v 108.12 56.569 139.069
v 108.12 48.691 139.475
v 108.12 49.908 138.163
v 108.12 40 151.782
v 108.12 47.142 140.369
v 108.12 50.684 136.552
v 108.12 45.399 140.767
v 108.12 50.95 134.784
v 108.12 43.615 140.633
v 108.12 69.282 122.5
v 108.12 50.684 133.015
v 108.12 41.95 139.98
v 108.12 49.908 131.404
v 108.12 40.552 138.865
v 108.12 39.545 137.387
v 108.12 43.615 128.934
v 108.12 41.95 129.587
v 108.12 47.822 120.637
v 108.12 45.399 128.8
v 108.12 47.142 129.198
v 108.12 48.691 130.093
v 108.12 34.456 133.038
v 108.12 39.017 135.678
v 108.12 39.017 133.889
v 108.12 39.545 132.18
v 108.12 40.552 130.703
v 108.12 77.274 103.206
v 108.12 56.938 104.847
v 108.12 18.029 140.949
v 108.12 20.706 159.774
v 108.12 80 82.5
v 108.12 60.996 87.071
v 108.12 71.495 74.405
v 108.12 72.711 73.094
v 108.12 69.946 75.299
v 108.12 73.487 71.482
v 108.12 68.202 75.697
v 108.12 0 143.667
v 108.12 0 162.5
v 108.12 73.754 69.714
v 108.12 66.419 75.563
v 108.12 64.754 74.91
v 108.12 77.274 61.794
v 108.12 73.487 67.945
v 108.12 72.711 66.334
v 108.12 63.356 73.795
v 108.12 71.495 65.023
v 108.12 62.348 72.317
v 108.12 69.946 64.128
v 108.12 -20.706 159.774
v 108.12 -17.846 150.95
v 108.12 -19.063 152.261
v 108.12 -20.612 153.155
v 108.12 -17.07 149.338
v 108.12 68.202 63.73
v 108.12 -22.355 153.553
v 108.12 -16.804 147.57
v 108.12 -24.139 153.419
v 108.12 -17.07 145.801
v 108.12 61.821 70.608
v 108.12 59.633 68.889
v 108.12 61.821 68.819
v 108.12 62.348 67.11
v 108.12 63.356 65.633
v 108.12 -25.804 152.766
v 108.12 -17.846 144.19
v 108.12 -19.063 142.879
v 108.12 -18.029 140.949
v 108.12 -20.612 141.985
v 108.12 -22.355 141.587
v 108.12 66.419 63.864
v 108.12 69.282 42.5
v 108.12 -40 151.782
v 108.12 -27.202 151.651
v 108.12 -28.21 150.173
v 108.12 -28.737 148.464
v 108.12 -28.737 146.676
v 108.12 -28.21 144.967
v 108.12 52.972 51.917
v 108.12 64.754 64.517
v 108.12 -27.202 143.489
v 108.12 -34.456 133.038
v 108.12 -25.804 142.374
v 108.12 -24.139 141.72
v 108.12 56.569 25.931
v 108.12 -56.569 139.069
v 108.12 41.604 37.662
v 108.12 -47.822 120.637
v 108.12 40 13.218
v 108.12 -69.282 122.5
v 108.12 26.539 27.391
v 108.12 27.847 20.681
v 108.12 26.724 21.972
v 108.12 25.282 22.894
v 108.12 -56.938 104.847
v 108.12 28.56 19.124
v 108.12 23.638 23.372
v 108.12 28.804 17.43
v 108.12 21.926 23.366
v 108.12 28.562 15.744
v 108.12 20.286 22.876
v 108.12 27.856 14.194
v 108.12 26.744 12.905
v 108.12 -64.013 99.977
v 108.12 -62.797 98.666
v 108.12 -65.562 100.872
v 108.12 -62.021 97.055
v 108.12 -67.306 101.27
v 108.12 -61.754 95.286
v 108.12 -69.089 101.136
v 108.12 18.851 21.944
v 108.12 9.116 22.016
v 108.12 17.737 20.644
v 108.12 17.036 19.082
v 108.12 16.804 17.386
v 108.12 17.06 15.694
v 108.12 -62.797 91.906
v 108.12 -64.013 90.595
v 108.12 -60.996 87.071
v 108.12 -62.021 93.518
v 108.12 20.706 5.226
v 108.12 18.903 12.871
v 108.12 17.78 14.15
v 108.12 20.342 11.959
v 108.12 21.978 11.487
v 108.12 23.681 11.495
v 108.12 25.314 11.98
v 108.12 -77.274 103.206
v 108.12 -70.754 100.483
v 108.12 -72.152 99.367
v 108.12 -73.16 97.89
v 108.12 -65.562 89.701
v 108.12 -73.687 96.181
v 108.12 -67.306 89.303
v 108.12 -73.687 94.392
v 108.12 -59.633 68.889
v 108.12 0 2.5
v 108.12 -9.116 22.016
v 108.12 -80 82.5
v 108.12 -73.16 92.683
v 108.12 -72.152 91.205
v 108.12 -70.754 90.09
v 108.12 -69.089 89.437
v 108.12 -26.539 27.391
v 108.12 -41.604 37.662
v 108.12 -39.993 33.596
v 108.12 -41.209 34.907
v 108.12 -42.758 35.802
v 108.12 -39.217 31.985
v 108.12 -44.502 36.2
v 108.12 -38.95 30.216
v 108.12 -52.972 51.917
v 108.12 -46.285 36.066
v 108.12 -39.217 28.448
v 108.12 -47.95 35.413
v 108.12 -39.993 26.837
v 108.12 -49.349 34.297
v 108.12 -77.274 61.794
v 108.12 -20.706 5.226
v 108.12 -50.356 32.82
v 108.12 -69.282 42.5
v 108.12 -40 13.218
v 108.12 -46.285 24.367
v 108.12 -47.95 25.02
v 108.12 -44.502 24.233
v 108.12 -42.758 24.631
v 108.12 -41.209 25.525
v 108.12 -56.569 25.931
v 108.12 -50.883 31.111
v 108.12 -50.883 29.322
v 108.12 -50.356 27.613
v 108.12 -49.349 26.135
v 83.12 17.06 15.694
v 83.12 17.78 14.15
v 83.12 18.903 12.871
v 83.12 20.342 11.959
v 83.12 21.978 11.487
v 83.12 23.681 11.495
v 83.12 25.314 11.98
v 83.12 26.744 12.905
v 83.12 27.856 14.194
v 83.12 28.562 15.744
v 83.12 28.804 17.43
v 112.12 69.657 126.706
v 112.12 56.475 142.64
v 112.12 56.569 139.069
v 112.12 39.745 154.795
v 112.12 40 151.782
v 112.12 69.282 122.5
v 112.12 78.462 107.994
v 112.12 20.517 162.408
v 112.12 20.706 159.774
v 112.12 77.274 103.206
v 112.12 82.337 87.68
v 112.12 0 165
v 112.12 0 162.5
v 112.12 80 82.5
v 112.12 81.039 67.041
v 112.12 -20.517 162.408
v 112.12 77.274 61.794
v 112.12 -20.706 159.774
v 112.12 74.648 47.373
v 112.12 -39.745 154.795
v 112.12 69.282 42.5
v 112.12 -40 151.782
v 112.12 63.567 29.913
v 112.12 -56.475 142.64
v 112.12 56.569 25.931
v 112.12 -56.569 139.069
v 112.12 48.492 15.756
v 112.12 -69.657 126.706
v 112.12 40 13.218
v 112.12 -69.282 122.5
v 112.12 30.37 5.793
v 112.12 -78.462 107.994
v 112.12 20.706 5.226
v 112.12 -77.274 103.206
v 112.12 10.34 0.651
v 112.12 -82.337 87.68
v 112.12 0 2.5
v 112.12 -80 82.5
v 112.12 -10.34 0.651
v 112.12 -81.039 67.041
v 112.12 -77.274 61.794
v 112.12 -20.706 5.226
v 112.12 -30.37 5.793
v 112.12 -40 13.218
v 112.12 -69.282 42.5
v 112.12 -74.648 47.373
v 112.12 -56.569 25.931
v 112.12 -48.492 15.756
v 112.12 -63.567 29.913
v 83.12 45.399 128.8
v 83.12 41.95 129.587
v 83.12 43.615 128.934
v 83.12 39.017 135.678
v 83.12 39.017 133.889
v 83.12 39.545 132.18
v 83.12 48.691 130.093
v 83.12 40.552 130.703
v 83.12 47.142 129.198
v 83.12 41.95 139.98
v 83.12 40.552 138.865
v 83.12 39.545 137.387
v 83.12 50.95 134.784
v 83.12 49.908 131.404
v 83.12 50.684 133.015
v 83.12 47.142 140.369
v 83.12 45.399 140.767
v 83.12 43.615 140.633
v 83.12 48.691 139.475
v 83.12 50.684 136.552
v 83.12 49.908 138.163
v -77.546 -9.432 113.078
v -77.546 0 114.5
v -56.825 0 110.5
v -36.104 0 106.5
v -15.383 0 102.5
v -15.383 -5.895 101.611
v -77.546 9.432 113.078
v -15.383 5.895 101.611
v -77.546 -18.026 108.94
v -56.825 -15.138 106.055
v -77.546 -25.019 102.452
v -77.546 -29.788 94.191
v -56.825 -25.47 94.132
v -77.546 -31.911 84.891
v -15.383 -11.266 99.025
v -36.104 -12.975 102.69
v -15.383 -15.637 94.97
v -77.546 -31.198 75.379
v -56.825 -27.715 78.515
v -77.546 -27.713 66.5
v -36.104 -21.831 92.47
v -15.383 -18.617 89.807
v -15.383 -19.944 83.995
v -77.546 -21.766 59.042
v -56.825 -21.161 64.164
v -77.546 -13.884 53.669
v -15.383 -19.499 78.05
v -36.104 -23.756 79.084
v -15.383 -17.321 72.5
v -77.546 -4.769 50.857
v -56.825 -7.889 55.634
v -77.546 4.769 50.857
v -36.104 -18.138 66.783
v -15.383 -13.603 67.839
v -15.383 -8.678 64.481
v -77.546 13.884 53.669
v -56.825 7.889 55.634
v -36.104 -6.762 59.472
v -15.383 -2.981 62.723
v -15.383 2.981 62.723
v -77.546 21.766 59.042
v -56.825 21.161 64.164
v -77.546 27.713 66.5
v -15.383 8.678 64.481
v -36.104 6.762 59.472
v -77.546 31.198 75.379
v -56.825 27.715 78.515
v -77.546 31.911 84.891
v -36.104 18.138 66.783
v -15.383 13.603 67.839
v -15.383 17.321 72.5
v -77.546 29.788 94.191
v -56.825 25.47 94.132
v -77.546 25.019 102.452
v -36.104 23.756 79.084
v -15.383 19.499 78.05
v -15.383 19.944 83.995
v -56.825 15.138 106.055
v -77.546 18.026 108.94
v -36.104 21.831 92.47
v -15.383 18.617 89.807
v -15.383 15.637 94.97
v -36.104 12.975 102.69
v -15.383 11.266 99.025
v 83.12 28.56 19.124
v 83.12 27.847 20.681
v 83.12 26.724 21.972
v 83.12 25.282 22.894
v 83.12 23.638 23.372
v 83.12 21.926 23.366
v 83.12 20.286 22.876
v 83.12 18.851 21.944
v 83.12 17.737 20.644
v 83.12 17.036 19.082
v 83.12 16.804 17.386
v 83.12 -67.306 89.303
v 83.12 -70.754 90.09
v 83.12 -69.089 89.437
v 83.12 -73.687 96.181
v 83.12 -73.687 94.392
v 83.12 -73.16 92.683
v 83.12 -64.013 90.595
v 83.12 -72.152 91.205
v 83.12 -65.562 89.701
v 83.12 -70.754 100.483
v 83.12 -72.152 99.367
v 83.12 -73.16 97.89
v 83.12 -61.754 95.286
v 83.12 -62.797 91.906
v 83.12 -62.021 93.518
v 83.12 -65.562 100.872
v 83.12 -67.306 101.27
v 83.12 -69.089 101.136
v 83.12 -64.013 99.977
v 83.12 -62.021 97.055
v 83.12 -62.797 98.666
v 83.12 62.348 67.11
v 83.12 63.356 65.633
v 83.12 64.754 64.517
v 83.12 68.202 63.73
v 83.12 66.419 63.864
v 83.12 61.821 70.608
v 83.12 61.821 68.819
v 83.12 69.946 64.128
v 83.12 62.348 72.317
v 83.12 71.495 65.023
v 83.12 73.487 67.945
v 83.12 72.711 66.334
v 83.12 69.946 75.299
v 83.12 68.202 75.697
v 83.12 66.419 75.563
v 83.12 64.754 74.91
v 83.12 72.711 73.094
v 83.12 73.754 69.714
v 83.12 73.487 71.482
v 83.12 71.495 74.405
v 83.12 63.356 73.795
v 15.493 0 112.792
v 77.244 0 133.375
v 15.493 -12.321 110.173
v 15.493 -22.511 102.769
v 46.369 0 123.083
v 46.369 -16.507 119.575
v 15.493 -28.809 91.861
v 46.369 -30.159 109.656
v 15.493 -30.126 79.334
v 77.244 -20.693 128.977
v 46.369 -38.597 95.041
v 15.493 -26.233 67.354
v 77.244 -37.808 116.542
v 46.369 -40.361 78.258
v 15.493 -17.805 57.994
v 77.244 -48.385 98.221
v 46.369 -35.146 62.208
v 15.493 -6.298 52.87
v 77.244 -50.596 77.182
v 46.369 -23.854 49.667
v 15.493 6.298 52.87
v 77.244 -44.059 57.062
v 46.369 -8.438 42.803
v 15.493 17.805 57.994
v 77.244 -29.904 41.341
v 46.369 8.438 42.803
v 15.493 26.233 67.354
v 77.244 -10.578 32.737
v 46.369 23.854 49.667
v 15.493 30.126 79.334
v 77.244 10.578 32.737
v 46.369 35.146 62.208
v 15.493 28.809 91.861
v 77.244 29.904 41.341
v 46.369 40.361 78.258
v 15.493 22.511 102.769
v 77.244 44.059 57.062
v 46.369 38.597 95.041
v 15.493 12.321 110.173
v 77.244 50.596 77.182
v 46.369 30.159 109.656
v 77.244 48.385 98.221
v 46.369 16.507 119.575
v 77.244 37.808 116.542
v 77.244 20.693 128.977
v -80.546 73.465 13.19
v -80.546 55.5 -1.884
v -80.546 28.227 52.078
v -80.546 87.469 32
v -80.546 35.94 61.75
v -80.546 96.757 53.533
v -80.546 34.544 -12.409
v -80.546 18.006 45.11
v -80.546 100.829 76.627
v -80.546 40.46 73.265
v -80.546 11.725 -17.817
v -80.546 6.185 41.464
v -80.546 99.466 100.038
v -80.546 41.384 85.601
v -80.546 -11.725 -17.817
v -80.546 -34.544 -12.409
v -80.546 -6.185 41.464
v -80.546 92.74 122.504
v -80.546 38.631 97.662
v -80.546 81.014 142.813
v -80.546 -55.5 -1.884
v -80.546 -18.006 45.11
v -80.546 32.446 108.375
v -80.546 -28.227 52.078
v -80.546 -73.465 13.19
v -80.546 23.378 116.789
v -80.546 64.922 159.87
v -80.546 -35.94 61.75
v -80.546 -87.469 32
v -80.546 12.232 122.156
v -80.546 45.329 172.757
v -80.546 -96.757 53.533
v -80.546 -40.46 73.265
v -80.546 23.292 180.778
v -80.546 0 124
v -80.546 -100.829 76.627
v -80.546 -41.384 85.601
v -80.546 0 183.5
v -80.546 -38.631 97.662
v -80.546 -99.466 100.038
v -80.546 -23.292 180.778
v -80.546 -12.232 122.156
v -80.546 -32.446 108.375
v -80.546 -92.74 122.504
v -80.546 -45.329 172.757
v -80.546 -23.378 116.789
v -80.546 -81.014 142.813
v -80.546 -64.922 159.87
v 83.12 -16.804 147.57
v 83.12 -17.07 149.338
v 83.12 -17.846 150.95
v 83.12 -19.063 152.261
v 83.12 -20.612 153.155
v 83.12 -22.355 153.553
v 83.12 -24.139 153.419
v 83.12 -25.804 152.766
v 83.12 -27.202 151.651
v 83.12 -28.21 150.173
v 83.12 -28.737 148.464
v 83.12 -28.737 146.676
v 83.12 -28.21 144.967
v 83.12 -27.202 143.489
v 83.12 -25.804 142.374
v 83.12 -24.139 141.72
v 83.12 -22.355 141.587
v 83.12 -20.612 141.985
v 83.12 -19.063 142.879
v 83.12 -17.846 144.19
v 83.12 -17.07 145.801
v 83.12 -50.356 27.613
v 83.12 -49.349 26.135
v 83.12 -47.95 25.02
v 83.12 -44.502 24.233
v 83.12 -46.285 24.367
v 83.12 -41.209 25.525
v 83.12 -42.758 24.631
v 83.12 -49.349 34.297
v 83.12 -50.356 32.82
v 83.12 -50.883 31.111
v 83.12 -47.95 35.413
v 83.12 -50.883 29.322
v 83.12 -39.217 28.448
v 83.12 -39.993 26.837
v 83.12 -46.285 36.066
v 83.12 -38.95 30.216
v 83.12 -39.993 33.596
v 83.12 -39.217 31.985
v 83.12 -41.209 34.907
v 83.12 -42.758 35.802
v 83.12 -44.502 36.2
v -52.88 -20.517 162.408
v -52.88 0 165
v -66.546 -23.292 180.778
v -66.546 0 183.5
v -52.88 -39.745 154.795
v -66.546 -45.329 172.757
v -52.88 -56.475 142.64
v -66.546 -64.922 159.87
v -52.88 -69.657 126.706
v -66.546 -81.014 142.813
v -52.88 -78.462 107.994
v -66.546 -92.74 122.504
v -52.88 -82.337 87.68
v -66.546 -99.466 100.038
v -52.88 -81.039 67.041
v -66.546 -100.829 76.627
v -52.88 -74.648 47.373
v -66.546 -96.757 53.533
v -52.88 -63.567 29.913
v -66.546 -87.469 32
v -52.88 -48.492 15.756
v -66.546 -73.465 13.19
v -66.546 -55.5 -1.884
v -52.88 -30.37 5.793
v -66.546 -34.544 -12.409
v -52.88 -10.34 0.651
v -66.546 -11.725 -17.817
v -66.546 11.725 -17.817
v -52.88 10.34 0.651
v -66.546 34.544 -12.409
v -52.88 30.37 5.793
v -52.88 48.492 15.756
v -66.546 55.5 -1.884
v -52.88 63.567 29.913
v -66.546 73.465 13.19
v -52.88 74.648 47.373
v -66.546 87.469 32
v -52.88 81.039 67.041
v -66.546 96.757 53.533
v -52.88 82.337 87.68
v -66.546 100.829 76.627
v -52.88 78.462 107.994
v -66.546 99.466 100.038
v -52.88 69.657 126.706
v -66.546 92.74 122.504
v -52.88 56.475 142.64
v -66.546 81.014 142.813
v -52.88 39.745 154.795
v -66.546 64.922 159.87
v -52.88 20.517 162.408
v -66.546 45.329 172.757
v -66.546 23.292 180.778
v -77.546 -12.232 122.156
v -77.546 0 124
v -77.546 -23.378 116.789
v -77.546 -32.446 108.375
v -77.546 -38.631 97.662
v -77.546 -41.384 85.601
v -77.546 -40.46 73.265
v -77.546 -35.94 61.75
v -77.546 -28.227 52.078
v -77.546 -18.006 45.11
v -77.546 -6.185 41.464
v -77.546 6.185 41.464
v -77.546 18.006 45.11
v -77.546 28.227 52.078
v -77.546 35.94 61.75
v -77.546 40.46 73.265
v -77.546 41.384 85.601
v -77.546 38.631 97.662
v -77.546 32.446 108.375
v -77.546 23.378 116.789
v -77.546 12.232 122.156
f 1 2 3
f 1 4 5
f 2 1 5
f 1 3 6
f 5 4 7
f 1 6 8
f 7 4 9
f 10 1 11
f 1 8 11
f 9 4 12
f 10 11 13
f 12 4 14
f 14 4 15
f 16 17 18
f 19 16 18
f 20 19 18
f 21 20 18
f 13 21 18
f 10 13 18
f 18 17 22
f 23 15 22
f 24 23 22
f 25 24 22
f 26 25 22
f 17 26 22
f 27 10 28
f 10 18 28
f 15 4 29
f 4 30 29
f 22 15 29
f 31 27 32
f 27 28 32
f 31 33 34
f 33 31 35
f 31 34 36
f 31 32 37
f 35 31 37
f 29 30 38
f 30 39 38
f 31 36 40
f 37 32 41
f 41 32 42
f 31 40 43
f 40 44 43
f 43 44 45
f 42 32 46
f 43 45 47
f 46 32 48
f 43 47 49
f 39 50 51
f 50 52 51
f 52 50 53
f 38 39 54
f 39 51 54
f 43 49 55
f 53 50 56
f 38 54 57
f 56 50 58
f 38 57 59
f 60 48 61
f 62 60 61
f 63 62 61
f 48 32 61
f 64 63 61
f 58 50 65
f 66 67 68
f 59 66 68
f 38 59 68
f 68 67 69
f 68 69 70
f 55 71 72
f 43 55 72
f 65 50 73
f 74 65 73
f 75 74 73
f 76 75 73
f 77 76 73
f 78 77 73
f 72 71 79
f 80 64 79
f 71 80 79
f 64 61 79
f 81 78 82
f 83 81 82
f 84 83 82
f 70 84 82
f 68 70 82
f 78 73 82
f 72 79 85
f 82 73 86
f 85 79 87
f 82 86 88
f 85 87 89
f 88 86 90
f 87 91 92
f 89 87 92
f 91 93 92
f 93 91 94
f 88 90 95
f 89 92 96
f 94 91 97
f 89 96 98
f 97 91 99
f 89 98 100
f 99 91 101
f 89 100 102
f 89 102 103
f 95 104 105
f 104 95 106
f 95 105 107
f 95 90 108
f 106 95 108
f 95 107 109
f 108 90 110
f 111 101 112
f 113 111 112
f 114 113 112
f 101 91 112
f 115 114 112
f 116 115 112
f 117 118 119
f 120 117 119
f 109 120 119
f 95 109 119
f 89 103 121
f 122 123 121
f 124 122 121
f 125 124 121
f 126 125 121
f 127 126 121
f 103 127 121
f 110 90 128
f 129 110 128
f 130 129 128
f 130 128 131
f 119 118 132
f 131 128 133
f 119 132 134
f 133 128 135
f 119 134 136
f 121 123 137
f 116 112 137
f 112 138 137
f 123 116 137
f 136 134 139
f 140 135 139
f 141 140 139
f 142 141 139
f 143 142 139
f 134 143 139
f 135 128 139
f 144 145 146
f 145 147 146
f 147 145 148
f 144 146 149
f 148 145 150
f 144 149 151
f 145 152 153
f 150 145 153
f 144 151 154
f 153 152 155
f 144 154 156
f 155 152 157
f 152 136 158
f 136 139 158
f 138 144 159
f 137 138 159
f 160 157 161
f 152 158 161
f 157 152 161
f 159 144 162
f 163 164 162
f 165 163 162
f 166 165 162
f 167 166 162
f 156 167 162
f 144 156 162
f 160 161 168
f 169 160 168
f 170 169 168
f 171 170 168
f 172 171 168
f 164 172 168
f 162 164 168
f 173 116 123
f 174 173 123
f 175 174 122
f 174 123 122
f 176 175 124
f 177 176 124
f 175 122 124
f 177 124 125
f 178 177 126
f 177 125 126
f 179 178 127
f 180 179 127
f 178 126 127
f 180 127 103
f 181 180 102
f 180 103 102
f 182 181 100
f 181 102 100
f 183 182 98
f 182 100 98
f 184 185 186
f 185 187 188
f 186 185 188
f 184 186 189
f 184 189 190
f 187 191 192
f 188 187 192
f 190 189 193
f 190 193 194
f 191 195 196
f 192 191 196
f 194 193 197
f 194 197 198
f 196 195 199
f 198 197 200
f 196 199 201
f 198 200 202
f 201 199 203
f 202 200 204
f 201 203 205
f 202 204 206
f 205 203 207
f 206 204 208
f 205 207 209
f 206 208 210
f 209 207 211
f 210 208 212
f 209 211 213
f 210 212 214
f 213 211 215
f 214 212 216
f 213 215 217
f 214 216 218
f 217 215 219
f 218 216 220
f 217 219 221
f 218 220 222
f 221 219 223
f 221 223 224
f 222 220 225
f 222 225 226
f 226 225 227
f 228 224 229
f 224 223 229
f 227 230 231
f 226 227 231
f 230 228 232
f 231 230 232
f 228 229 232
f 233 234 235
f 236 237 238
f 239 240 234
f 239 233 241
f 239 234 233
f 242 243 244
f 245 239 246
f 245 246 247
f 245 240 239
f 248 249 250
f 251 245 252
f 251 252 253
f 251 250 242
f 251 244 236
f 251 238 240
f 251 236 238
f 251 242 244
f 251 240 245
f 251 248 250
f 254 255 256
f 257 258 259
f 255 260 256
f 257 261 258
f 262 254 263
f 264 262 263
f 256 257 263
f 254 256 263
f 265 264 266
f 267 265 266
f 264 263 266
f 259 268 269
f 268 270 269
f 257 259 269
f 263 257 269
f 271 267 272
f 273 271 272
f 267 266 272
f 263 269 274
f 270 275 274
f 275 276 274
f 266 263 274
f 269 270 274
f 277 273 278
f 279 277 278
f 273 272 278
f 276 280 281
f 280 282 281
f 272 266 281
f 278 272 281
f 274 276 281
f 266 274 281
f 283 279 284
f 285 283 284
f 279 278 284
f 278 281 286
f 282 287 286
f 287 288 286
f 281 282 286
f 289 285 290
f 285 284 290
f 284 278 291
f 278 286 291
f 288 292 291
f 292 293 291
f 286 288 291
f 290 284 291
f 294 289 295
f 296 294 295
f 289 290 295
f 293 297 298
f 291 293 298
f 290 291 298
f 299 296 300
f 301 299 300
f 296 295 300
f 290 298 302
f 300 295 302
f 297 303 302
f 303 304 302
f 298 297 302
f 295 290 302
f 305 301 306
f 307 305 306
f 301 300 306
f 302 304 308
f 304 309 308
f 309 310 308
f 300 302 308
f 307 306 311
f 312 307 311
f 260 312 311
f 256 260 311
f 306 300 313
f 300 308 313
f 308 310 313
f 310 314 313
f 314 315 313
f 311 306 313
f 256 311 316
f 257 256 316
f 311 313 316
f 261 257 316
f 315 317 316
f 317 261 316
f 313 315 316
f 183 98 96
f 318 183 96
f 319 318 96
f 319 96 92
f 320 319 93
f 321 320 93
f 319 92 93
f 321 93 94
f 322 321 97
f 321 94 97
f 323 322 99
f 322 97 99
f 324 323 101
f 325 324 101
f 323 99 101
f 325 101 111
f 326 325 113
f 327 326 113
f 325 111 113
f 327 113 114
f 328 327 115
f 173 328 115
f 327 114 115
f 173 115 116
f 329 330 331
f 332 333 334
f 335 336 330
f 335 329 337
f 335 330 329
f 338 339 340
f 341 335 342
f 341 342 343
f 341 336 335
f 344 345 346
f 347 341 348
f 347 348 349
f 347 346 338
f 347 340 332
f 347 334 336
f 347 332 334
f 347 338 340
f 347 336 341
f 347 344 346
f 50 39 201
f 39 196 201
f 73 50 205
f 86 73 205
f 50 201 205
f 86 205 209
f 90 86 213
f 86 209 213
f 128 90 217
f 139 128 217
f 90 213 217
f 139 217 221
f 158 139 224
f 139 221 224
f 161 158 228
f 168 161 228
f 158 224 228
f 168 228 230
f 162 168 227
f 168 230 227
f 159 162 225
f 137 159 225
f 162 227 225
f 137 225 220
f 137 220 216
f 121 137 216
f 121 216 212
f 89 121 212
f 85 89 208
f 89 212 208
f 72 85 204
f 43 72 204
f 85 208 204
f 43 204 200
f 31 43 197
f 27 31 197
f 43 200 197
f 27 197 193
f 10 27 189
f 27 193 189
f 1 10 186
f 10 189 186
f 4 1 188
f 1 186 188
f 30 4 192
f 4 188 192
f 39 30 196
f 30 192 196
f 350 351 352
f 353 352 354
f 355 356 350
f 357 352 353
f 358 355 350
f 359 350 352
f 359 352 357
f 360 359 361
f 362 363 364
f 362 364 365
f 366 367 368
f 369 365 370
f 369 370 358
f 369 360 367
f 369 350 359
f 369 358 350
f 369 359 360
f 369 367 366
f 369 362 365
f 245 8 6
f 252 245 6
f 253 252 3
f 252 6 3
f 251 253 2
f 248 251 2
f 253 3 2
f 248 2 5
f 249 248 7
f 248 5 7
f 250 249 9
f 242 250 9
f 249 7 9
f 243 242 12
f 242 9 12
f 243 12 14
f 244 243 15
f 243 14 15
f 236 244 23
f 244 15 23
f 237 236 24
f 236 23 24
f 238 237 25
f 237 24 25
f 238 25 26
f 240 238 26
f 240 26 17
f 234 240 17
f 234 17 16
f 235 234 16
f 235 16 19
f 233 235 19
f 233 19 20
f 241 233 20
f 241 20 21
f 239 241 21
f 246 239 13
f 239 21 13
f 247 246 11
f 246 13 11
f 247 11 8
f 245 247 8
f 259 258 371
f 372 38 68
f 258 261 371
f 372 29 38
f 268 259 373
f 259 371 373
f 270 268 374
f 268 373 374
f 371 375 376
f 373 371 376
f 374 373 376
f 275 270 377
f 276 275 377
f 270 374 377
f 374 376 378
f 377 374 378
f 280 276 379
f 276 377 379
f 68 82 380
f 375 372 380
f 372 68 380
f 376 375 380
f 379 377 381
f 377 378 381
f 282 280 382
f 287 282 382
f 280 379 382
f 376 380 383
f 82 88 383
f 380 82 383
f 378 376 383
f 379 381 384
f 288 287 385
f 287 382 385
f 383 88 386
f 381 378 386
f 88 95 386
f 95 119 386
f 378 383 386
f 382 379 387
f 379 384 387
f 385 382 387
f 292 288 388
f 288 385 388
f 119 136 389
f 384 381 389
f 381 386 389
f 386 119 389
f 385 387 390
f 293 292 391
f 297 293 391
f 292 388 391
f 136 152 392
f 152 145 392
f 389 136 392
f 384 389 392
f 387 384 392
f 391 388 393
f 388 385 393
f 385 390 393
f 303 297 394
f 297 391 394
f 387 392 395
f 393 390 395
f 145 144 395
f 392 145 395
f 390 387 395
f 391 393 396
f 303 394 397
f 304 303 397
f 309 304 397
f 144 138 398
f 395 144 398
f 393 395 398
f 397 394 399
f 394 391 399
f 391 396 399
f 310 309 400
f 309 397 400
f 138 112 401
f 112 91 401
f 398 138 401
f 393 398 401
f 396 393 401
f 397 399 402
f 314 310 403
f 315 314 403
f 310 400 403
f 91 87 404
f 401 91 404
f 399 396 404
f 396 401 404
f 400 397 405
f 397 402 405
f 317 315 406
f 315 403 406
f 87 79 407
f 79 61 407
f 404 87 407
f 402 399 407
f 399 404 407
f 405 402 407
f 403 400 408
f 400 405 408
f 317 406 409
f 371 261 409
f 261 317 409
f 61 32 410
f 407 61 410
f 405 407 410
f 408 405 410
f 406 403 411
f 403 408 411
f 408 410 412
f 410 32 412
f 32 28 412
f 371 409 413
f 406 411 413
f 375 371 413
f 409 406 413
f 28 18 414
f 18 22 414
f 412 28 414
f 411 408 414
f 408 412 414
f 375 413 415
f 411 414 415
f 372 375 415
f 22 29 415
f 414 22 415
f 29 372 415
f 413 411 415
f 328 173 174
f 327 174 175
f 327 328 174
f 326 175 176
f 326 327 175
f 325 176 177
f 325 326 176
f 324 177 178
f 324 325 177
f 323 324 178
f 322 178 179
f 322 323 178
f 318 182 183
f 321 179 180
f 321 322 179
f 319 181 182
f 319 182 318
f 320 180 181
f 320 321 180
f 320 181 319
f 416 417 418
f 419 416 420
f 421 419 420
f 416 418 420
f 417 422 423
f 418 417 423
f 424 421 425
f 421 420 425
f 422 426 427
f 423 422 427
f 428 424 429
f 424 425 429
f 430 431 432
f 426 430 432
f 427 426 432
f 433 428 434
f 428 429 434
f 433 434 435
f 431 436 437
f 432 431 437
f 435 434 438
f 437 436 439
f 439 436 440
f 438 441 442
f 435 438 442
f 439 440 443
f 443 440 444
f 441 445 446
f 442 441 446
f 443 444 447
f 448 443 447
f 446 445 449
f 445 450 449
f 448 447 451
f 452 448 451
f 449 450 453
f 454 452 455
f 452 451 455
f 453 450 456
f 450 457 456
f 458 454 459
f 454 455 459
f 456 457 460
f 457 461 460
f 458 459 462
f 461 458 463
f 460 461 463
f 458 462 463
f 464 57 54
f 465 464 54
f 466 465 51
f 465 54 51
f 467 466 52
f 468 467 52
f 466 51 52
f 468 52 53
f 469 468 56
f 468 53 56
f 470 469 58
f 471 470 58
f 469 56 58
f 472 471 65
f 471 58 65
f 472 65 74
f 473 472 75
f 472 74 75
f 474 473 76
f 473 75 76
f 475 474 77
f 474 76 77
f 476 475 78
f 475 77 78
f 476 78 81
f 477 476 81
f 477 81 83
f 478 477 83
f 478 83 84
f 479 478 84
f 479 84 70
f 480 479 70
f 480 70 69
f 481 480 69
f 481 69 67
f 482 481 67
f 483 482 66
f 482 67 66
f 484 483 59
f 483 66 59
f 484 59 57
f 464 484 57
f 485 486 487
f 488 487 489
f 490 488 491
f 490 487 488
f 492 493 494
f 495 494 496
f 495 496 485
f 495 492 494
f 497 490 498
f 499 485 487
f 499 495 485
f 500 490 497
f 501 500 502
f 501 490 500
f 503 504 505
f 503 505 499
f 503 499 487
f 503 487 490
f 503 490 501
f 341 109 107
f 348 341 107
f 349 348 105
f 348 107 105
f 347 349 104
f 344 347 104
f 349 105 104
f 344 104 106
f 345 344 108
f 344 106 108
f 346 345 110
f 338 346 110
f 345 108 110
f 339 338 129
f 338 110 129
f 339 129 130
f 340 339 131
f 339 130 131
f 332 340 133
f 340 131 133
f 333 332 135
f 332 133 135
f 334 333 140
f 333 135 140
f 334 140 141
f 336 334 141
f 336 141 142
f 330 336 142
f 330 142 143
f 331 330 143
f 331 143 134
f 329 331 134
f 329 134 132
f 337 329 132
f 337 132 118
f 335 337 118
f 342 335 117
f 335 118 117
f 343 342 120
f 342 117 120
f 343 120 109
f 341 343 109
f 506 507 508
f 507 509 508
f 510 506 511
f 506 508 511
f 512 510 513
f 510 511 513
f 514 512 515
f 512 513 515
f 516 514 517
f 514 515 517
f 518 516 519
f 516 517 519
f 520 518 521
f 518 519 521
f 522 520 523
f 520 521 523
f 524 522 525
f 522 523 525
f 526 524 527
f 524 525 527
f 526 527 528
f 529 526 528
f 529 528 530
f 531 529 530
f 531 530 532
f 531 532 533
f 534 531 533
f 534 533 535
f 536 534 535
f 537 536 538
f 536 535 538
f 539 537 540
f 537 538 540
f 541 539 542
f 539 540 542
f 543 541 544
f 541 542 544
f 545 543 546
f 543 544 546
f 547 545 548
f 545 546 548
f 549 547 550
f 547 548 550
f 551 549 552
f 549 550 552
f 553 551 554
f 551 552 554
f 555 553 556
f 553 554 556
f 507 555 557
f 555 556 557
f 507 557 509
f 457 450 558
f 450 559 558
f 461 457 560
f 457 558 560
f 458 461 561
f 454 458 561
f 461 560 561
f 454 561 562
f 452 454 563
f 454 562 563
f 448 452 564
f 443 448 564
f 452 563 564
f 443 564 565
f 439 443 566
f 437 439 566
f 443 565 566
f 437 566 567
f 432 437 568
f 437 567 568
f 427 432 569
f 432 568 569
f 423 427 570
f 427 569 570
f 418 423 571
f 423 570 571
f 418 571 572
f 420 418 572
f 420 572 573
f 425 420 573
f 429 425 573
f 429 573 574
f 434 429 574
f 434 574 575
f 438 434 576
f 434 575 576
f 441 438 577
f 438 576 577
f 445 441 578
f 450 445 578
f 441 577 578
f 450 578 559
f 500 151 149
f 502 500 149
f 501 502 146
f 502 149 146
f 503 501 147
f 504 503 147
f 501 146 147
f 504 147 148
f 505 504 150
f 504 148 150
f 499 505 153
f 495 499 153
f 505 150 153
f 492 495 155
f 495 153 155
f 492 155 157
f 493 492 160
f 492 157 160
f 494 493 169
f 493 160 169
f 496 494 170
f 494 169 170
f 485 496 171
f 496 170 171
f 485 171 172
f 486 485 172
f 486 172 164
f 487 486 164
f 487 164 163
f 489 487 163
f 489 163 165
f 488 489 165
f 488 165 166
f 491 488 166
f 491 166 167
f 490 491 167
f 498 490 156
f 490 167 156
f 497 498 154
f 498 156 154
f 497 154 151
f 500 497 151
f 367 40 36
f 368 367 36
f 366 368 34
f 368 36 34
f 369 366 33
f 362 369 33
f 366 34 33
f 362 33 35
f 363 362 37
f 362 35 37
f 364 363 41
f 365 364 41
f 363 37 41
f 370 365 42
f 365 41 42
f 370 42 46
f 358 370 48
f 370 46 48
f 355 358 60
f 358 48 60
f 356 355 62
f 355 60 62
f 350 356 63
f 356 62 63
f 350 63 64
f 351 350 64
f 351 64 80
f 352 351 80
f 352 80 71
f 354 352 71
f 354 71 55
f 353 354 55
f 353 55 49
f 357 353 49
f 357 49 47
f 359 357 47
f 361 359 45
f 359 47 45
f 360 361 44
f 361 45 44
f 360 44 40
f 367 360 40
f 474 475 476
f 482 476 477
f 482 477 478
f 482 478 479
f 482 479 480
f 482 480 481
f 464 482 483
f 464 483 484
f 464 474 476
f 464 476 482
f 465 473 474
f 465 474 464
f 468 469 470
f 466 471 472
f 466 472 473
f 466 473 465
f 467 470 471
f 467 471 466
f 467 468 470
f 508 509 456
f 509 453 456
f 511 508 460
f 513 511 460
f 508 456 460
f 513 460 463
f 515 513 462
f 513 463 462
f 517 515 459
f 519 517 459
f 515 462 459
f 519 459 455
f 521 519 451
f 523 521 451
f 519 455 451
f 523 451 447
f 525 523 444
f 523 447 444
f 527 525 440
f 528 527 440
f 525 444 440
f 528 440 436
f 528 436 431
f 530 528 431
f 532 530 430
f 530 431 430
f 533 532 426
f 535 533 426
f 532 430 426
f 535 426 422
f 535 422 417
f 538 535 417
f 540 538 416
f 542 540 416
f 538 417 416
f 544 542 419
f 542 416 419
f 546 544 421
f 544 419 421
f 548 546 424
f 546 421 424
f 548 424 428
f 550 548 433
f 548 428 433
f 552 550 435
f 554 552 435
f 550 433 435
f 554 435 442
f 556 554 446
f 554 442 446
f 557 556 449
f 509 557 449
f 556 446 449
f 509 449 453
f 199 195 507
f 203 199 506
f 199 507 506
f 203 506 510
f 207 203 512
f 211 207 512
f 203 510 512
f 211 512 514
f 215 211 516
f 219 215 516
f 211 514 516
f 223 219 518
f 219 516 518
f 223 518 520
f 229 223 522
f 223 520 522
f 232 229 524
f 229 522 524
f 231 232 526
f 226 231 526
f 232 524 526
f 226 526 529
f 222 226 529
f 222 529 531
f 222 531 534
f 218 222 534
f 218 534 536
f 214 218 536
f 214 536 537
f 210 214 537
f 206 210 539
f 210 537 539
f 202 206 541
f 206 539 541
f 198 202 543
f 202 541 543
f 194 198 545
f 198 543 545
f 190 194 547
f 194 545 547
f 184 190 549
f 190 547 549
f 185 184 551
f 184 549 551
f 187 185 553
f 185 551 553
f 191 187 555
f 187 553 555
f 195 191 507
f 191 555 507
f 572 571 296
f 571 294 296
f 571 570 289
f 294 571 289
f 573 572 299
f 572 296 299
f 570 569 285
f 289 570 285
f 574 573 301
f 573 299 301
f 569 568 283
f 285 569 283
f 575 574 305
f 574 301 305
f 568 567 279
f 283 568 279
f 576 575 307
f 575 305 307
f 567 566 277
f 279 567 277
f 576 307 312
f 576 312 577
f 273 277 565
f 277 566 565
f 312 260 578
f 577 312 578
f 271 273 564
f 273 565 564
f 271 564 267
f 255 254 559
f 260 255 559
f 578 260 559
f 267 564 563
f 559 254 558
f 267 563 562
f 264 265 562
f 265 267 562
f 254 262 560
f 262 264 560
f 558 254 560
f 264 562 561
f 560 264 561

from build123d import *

# Parameters (mm, degrees)
F3_R     = 6
F4_DEPTH = 25


with BuildPart() as f1:
    # F0 (on Front) → F1 (revolve)
    with BuildSketch(Plane.XZ):
        Polygon((-80.545663, 183.5), (-80.545663, 124), (-77.545663, 124), (-77.545663, 114.5), (-15.382721, 102.5), (108.119988, 143.666695), (108.119988, 162.5), (112.119988, 162.5), (112.119988, 165), (-37.880012, 165), (-52.880012, 165), (-66.545663, 183.5), align=None)
    revolve(axis=Axis((211.105403, 0, 82.5), (1, 0, 0)))

    # F3 (on face) → F4 (cut)
    with BuildSketch(Plane.YZ.offset(108.119988)):
        with Locations((-22.803705, 147.569913)):
            Circle(F3_R)
        with Locations((-67.75405, 95.286369)):
            Circle(F3_R)
        with Locations((-44.950345, 30.216456)):
            Circle(F3_R)
        with BuildLine():
            ThreePointArc((17.060371, 15.693966), (23.681201, 11.494601), (28.803705, 17.430087))
            ThreePointArc((28.803705, 17.430087), (21.926209, 23.365574), (17.060371, 15.693966))
        make_face()
        with Locations((67.75405, 69.713631)):
            Circle(F3_R)
        with Locations((44.950345, 134.783544)):
            Circle(F3_R)
    extrude(amount=-F4_DEPTH, mode=Mode.SUBTRACT)


solid = f1.part
